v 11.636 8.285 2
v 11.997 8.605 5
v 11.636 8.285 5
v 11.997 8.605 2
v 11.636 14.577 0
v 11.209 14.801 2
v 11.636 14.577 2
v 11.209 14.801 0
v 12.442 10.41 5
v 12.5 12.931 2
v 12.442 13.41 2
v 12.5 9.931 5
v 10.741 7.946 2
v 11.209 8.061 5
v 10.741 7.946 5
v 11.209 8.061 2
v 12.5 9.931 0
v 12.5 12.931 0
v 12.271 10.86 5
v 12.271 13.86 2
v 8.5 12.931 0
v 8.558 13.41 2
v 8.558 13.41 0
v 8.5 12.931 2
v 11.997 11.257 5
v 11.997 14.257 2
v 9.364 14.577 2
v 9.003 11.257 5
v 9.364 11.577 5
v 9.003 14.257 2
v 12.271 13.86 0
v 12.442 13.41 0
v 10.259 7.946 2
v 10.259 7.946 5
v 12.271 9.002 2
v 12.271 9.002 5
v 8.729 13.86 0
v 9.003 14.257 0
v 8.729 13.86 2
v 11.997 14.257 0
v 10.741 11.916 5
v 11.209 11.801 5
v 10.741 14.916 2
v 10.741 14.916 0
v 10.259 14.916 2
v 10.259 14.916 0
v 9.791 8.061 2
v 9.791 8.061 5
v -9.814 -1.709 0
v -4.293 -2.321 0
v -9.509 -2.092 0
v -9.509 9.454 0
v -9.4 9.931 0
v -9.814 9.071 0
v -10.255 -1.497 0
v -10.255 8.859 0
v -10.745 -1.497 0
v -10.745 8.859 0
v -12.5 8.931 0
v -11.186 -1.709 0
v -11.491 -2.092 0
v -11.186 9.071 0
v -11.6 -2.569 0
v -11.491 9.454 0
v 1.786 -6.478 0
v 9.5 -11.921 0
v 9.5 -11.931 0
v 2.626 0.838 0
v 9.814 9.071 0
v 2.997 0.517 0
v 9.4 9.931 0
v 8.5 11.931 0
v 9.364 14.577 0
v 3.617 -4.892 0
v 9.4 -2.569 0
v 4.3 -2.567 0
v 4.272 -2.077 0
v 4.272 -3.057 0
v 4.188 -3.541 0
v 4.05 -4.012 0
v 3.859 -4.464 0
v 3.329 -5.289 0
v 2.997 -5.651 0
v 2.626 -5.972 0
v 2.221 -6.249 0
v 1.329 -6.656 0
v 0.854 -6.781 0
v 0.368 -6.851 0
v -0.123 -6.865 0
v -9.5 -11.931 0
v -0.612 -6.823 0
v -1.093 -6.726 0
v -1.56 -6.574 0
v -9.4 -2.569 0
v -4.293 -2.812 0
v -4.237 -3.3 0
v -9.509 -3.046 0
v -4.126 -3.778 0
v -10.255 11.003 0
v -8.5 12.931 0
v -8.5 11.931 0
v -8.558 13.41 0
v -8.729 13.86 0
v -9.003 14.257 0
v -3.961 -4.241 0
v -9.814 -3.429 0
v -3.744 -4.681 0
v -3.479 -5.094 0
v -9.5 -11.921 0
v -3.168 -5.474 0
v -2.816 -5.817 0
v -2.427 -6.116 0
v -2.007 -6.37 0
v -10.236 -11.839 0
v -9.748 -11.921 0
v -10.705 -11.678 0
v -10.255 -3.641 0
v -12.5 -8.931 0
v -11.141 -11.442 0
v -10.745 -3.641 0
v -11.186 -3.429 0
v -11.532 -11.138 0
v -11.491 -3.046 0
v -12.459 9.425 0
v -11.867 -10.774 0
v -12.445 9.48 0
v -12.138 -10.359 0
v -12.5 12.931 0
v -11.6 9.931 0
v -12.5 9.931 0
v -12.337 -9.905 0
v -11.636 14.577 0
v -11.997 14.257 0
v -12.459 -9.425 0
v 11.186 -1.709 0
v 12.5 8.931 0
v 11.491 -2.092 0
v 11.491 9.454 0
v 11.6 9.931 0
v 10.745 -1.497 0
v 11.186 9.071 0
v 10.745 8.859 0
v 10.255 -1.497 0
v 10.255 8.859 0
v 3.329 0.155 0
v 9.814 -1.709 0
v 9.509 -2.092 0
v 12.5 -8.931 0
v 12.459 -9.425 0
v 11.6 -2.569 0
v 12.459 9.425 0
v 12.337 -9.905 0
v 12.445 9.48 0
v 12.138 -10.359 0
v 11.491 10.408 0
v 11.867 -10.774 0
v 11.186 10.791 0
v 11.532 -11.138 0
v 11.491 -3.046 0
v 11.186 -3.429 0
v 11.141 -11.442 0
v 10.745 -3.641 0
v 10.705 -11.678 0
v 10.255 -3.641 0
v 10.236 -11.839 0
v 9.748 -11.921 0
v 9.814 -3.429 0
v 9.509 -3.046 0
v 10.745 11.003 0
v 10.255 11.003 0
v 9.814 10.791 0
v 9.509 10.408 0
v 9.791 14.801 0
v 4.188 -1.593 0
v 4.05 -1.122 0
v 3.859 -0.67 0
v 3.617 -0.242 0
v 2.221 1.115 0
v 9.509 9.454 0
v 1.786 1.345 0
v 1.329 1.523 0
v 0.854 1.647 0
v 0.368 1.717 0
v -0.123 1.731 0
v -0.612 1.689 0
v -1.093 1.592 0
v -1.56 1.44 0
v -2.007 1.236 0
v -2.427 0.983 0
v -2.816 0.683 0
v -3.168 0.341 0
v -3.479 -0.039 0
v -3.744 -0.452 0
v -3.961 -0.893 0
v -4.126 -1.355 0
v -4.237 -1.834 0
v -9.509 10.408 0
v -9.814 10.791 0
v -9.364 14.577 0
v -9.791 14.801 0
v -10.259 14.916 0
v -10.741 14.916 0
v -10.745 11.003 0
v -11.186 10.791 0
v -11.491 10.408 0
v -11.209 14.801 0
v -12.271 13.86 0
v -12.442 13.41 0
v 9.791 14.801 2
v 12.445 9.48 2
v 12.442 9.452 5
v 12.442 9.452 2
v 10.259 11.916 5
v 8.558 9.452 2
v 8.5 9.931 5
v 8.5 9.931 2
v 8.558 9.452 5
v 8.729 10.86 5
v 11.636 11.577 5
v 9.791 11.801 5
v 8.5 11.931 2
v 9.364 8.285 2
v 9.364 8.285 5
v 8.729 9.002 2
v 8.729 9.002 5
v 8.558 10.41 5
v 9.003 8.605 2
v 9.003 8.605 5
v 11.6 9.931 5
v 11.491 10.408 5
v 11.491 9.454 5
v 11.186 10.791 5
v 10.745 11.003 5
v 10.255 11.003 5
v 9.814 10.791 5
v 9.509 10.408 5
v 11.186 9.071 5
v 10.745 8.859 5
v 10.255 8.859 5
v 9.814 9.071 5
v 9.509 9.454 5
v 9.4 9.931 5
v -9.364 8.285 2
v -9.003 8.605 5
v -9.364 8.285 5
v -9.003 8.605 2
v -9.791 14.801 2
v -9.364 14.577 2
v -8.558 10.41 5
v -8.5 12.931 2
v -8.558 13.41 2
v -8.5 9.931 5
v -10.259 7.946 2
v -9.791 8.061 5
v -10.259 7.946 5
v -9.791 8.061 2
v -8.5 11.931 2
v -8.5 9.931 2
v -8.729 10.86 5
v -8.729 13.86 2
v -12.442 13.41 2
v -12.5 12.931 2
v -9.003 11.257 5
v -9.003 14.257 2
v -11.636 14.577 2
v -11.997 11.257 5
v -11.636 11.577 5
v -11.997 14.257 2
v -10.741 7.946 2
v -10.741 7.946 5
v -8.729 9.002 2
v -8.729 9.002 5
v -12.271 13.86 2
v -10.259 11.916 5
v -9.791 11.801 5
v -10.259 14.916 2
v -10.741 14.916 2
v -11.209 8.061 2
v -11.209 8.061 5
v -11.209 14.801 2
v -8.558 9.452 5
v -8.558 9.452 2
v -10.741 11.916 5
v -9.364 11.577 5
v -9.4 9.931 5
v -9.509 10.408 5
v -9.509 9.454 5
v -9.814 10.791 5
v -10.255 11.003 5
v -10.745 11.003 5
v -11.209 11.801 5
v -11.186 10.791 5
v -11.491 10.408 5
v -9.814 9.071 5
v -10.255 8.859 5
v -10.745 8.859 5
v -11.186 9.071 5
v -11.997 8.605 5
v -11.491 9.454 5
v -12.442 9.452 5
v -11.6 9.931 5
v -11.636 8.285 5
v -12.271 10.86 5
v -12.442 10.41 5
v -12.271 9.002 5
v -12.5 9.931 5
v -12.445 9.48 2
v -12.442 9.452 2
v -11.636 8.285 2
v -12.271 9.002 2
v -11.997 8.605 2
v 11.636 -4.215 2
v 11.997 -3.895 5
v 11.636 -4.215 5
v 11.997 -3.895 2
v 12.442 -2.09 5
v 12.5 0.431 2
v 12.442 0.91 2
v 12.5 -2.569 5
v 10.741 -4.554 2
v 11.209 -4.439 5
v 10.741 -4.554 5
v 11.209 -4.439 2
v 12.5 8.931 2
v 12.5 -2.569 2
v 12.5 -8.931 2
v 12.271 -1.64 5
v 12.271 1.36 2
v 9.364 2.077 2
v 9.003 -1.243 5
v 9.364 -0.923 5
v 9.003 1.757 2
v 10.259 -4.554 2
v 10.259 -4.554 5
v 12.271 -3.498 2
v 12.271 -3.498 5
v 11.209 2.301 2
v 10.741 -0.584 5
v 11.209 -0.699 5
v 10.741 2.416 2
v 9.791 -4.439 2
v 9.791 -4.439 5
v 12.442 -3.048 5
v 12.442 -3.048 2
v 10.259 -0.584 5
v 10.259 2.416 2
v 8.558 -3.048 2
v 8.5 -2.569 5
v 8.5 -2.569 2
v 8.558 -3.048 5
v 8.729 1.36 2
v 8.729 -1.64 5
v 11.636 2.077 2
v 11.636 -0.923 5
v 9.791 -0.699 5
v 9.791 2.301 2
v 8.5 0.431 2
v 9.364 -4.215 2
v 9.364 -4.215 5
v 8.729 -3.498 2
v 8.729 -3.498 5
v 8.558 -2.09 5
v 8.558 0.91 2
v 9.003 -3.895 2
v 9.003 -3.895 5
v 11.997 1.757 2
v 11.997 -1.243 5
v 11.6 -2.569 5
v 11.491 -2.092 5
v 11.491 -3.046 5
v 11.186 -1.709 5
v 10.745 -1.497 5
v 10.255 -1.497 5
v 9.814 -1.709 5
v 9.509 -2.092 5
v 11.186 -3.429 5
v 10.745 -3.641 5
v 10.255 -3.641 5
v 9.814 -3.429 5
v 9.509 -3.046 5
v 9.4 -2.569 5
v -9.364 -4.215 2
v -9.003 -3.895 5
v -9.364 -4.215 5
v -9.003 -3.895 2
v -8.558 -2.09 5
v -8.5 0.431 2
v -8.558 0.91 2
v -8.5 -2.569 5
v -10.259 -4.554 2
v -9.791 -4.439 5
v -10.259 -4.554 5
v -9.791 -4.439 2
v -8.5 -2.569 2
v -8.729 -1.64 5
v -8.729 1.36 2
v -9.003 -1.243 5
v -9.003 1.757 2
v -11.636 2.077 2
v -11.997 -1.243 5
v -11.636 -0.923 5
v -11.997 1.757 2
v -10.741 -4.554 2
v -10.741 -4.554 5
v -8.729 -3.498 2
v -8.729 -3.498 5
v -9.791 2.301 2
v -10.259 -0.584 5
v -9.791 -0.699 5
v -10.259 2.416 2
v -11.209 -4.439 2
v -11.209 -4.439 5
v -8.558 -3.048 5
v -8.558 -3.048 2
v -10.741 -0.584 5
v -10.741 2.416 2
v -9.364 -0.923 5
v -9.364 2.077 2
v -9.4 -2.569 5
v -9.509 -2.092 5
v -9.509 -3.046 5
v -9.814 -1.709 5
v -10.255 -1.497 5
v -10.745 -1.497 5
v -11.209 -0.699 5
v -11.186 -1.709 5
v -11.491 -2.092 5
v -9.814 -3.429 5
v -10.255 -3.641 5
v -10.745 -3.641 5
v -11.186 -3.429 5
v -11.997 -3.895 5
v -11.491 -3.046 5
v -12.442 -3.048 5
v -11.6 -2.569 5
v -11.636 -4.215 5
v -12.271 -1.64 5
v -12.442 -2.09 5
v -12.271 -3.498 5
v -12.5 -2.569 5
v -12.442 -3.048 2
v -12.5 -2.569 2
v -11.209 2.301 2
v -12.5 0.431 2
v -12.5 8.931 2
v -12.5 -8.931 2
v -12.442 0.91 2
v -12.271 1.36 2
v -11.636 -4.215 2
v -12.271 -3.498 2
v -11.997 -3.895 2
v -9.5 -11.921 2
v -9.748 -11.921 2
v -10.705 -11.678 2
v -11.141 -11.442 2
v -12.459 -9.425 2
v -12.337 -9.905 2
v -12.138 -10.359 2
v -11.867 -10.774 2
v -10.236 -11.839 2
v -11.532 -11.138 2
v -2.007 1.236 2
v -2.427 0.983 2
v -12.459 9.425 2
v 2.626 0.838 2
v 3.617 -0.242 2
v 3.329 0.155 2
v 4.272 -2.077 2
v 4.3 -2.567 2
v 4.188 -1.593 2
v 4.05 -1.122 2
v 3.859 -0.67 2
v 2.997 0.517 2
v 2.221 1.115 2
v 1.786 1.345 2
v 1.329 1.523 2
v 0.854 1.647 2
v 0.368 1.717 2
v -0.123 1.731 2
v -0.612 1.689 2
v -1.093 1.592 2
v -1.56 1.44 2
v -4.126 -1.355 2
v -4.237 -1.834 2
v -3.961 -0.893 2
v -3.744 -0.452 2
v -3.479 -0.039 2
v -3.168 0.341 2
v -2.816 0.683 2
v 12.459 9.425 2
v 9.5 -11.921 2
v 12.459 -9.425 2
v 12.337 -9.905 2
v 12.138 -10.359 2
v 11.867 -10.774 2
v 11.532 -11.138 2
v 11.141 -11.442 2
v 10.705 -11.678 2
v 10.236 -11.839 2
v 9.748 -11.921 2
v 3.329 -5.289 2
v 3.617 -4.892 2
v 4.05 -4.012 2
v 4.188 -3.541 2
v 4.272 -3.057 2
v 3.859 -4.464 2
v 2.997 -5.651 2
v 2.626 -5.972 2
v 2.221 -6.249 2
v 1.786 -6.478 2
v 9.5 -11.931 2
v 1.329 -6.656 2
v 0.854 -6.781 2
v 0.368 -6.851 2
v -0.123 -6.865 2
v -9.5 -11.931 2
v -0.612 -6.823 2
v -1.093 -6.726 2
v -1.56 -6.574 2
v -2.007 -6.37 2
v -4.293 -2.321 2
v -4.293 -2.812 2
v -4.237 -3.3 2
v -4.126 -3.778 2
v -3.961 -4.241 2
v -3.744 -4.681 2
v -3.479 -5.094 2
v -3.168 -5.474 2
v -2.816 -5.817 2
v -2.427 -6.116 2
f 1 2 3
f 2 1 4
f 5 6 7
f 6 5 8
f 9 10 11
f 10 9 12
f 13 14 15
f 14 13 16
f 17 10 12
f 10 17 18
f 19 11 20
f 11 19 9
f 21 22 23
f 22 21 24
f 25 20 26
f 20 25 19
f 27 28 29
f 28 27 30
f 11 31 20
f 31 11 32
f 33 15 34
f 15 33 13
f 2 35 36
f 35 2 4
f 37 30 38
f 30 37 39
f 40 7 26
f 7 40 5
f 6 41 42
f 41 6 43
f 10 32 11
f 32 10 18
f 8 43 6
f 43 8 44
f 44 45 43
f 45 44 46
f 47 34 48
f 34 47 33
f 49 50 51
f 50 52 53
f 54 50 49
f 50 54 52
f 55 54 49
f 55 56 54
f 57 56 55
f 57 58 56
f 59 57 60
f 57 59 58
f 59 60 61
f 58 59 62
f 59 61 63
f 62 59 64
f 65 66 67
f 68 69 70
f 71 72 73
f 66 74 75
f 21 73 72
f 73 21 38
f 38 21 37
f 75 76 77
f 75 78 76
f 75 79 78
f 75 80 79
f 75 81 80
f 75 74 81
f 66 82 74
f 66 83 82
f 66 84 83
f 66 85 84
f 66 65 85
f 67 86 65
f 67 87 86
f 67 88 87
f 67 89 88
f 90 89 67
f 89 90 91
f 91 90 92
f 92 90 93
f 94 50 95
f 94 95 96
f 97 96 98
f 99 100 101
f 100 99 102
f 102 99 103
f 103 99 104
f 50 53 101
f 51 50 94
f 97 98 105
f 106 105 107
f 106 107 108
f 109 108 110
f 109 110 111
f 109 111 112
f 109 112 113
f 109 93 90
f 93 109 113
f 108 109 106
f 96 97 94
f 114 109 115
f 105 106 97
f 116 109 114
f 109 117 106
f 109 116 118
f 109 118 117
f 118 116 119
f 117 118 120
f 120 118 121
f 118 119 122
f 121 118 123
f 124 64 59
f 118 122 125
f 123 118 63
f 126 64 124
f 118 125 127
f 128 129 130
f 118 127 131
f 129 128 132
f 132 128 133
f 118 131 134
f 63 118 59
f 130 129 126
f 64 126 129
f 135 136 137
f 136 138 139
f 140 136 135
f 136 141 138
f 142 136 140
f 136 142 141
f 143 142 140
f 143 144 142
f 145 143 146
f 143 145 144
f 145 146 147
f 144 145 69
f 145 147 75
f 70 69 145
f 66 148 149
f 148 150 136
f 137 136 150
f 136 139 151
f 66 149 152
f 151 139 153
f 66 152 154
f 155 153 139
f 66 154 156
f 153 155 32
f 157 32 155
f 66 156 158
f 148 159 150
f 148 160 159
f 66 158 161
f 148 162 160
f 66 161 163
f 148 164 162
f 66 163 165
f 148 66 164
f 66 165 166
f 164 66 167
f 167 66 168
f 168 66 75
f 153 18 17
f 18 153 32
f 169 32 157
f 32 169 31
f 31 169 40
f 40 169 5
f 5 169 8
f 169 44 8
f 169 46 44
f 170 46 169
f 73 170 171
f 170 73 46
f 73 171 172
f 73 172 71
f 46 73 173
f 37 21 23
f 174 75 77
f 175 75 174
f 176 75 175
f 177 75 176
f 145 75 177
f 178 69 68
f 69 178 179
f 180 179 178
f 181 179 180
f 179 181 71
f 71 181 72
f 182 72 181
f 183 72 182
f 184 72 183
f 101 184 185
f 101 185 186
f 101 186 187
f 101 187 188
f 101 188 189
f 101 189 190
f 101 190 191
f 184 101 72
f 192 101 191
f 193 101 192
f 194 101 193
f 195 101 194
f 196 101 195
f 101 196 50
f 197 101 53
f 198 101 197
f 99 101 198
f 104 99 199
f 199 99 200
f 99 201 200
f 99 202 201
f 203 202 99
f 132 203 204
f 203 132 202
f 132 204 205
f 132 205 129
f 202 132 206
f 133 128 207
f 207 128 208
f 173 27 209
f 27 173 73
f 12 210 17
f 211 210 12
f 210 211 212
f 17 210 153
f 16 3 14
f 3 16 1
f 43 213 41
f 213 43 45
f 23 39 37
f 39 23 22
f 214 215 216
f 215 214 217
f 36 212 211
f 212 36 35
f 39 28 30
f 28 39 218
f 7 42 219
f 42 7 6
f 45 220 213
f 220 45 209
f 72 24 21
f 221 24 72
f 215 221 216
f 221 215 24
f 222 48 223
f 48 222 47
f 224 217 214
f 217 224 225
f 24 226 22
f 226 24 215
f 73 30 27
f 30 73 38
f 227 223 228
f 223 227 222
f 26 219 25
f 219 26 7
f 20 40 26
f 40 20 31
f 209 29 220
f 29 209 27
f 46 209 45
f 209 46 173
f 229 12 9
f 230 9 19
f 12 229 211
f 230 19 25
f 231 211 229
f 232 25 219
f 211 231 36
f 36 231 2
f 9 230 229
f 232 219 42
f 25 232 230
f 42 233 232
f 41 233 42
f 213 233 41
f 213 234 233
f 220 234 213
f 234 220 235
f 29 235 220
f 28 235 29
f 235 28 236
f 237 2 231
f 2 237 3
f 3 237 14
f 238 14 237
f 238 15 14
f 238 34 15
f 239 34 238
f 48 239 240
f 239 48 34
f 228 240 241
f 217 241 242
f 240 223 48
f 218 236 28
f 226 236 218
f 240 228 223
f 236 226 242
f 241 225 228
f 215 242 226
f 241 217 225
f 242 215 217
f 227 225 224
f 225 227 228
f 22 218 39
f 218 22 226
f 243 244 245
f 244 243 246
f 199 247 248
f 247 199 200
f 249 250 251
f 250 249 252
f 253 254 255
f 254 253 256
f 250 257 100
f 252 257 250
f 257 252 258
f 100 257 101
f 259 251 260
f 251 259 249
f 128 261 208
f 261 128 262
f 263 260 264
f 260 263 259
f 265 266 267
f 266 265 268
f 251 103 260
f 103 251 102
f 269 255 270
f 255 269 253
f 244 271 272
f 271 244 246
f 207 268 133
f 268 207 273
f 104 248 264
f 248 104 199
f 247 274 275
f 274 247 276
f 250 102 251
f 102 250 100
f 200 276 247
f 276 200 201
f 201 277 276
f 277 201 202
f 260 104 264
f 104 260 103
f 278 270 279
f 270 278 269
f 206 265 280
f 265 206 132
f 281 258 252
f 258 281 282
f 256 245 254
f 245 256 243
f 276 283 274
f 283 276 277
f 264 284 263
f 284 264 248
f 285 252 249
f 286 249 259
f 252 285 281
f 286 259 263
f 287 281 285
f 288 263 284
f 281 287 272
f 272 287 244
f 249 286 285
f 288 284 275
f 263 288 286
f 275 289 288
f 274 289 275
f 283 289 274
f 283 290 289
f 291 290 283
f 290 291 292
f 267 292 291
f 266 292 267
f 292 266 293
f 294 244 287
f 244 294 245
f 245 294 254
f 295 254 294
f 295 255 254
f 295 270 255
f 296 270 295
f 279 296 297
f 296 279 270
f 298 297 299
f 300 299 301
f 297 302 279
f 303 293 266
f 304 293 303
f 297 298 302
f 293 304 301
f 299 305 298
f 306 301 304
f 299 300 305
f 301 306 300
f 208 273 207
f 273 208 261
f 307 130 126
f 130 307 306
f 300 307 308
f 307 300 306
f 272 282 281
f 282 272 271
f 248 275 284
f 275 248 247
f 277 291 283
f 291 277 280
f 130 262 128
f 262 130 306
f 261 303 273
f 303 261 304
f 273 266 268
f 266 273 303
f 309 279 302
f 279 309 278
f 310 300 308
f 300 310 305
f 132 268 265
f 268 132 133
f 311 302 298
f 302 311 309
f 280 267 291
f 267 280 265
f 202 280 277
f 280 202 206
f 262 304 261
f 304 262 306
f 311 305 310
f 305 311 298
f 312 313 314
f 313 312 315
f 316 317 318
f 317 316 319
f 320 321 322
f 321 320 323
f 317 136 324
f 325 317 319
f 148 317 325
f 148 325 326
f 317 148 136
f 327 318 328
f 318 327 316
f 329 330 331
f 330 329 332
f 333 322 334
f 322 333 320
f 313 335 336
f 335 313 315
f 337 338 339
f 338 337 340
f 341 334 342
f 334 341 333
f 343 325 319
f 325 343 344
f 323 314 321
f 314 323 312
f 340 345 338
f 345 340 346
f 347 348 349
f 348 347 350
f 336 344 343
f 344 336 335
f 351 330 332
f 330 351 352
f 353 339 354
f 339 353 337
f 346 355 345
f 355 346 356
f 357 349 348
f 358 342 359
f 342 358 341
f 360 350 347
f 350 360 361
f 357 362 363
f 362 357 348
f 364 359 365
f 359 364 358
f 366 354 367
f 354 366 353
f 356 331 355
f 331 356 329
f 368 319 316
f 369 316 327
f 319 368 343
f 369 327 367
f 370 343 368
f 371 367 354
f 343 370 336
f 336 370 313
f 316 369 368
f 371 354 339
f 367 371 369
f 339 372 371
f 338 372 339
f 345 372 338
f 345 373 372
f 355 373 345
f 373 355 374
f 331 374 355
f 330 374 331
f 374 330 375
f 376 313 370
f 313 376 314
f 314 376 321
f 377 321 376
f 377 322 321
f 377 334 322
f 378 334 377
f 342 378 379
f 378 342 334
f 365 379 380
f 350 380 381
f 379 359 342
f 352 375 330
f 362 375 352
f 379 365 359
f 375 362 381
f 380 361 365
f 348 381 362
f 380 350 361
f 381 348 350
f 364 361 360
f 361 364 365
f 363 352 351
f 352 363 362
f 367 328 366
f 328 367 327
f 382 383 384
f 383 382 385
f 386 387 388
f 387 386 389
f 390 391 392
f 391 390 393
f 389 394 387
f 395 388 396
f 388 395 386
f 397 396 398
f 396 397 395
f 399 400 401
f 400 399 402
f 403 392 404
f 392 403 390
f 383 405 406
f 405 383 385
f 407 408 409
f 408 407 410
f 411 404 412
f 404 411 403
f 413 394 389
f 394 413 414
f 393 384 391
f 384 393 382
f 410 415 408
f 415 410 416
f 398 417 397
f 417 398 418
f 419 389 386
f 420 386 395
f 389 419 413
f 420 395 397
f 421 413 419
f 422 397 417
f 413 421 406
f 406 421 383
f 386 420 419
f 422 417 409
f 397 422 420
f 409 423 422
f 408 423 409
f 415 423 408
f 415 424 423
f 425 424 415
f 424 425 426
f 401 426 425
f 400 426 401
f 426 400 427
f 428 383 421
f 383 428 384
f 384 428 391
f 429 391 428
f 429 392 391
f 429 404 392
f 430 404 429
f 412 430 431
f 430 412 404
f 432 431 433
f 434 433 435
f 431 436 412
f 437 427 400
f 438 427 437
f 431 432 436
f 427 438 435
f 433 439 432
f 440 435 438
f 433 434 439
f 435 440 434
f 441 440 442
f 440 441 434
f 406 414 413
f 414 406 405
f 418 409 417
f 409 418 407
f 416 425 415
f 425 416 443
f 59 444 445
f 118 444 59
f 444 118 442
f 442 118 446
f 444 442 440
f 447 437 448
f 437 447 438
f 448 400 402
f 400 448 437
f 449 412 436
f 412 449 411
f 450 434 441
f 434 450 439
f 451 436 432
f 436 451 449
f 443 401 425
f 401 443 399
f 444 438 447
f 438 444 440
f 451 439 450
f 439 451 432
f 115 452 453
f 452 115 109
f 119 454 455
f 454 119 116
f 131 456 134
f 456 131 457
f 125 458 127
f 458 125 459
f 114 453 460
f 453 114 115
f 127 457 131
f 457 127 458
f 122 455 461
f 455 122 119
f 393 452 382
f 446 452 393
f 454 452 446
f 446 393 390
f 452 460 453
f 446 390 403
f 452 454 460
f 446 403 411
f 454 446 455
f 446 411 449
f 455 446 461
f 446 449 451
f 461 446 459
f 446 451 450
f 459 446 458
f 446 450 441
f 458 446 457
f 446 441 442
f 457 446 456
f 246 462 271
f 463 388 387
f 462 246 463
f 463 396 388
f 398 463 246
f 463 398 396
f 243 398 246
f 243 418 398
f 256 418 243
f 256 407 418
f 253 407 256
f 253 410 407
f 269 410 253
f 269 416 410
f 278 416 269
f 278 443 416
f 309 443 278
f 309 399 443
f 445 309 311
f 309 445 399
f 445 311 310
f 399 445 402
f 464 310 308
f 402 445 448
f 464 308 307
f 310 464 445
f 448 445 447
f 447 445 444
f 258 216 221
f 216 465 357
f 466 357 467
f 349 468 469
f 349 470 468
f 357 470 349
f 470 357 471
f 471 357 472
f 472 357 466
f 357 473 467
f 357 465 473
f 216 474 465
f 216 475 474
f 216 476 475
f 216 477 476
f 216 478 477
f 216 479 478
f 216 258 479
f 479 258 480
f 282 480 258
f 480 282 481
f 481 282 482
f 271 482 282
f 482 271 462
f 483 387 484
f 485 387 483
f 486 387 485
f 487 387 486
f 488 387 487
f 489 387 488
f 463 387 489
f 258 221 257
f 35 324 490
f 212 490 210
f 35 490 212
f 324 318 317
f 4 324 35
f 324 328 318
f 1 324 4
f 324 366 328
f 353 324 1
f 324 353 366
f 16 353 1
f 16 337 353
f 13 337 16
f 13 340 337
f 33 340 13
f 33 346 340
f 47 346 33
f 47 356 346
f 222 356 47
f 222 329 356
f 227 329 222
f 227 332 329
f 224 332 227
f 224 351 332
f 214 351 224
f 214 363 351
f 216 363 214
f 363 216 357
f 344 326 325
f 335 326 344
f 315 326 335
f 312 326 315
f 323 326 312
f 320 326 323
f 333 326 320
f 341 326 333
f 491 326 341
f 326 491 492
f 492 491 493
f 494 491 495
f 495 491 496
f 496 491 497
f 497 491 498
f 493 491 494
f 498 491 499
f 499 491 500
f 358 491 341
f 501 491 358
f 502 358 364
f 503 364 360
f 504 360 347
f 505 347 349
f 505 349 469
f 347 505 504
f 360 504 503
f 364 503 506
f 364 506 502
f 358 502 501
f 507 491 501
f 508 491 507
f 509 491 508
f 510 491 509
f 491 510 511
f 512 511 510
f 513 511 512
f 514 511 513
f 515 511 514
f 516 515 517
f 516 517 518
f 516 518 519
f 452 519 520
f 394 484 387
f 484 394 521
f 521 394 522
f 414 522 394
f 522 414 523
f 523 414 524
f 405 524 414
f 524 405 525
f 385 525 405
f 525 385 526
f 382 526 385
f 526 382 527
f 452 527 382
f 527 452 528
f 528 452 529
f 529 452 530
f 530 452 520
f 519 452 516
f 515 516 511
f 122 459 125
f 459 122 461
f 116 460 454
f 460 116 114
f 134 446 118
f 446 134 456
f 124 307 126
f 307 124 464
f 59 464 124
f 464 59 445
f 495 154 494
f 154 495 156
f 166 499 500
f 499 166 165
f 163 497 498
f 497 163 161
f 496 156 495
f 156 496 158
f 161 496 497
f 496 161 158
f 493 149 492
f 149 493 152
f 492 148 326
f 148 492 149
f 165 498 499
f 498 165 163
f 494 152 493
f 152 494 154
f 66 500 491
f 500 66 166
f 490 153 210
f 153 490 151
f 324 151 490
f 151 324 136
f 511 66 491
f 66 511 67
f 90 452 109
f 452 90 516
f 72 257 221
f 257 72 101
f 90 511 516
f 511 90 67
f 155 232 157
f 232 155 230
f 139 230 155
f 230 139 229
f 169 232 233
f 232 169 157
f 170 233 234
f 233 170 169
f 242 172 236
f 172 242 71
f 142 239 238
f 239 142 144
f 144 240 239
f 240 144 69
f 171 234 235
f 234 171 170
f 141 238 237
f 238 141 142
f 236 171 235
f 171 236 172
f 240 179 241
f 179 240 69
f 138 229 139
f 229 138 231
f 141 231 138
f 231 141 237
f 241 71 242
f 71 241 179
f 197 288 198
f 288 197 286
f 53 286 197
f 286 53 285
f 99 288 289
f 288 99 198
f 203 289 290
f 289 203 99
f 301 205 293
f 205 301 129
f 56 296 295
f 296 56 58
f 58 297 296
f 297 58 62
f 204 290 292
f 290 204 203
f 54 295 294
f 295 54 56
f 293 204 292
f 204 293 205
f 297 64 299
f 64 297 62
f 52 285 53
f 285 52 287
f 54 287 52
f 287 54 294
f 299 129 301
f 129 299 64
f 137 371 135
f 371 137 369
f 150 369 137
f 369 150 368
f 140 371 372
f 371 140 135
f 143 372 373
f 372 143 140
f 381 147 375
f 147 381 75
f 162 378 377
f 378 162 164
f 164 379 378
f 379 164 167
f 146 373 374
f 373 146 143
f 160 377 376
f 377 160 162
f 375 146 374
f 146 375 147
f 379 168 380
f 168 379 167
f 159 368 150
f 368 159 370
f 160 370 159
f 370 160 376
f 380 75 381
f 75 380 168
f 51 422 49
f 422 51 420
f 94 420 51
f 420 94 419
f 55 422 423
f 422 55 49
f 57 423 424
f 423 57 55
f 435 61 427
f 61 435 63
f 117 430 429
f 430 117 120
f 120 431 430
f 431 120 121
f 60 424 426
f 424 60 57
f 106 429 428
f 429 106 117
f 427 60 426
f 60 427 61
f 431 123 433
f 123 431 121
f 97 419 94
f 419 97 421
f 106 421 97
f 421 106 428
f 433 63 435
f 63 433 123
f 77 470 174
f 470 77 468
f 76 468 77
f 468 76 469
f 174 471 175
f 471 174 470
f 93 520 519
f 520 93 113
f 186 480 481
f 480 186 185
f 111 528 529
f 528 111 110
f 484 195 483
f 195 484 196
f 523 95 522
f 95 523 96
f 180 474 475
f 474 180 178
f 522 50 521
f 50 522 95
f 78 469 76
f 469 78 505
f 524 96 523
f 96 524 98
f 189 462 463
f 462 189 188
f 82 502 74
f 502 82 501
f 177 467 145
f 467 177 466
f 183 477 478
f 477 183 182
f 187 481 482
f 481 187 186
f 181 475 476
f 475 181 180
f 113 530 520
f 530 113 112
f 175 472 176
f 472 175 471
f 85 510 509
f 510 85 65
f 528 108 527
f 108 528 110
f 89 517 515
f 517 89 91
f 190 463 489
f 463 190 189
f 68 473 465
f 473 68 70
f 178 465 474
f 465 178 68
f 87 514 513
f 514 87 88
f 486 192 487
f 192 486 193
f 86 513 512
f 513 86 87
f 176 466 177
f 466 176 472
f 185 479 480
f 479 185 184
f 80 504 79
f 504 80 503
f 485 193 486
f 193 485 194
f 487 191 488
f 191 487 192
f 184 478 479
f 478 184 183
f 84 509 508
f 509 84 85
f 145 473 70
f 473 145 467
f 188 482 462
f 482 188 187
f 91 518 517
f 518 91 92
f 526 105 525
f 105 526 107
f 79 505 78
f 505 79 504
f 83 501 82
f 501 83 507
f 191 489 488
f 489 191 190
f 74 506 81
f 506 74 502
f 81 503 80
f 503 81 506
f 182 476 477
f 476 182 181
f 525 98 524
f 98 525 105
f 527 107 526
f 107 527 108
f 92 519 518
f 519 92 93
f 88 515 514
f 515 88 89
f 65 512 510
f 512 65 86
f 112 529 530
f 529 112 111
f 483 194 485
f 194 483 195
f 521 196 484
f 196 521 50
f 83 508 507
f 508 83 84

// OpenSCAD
use <MCAD/boxes.scad>
$fs = 0.5;
$fa=1;

module mounting_point (
    translation_vector = [0,0,0],
    rotation_vector = [0,0,0],
    board_length,
    board_width,
    edge_to_holes,
    hole_outer_radius,
    hole_inner_radius,
    distance_between_holes_length,
) {
    
    
    
    hole_position_x = board_width/2 - edge_to_holes;
    hole_position_y = board_length/2 - edge_to_holes;

    hole_position_1 = [hole_position_x, hole_position_y, 0];
    hole_position_2 = [-hole_position_x, hole_position_y, 0];
    hole_position_3 = [hole_position_x, hole_position_y - distance_between_holes_length, 0];
    hole_position_4 = [-hole_position_x, hole_position_y - distance_between_holes_length, 0];
    
    difference() {
        union() {
            children();
            
            translate(translation_vector)
            rotate(rotation_vector)
            union() {
                translate([0,0,1])
                roundedBox(size=[board_width, board_length,2],
                    radius=3, sidesonly=true);

                translate(hole_position_1)
                cylinder(r=hole_outer_radius, h=5);

                translate(hole_position_2)
                cylinder(r=hole_outer_radius, h=5); 

                translate(hole_position_3)
                cylinder(r=hole_outer_radius, h=5); 

                translate(hole_position_4)
                cylinder(r=hole_outer_radius, h=5); 
            }
        }
    
        translate(translation_vector)
        rotate(rotation_vector)
        translate([0,0,-5])
        scale([1,1,3]){
            translate(hole_position_1)
            cylinder(r=hole_inner_radius, h=5); 

            translate(hole_position_2)
            cylinder(r=hole_inner_radius, h=5); 

            translate(hole_position_3)
            cylinder(r=hole_inner_radius, h=5); 

            translate(hole_position_4)
            cylinder(r=hole_inner_radius, h=5); 
        }
    }
}


module pi_mount (translation_vector  = [0,0,0], rotation_vector = [0,0,0]) {
    mounting_point(
        translation_vector,
        rotation_vector,
        85,
        56,
        3.5,
        3,
        2.75/2,
        58
    ){
        children();
    };
}

module pi_camera_mount_no_supports(translation_vector = [0,0,0], rotation_vector = [0,0,0]) {
    difference() {
        mounting_point(
            translation_vector,
            rotation_vector,
            23.862,
            25,
            2,
            2,
            1.1,
            12.5
        ){
            children();
        }
        translate(translation_vector)
        rotate(rotation_vector)
        translate([0,-14.5+23.8662/2,-5])
        cylinder(r=4.3,h=15);
    }
}


module pi_camera_mount (translation_vector = [0,0,0], rotation_vector = [0,0,0]) { 
    difference() {
    mounting_point(
        translation_vector,
        rotation_vector,
        23.862,
        25,
        2,
        2,
        1.1,
        12.5
    ){
        children();
        
        hole_position_x = 25/2 - 2;
        hole_position_y = 23.862/2 - 2;

        hole_position_1 = [hole_position_x, hole_position_y, 0];
        hole_position_2 = [-hole_position_x, hole_position_y, 0];
        hole_position_3 = [hole_position_x, hole_position_y - 12.5, 0];
        hole_position_4 = [-hole_position_x, hole_position_y - 12.5, 0];
                
        translate(translation_vector)
        rotate(rotation_vector){
            hull() {
                translate(hole_position_1)
                cylinder(r=2, h=5);
                translate([0,3,0])
                translate(hole_position_1)
                cylinder(r=2, h=2);
            }

            hull() {
                translate(hole_position_2)
                cylinder(r=2, h=5);
                translate([0,3,0])
                translate(hole_position_2)
                cylinder(r=2, h=2);
            } 

            hull() {
                translate(hole_position_3)
                cylinder(r=2, h=5);
                translate([0,3,0])
                translate(hole_position_3)
                cylinder(r=2, h=2);
            }

            hull() {
                translate(hole_position_4)
                cylinder(r=2, h=5);
                translate([0,3,0])
                translate(hole_position_4)
                cylinder(r=2, h=2);
            }
        }
    };
    translate(translation_vector)
    rotate(rotation_vector)
    translate([0,-14.5+23.8662/2,-5])
    cylinder(r=4.3,h=15);
}
}

pi_camera_mount();
